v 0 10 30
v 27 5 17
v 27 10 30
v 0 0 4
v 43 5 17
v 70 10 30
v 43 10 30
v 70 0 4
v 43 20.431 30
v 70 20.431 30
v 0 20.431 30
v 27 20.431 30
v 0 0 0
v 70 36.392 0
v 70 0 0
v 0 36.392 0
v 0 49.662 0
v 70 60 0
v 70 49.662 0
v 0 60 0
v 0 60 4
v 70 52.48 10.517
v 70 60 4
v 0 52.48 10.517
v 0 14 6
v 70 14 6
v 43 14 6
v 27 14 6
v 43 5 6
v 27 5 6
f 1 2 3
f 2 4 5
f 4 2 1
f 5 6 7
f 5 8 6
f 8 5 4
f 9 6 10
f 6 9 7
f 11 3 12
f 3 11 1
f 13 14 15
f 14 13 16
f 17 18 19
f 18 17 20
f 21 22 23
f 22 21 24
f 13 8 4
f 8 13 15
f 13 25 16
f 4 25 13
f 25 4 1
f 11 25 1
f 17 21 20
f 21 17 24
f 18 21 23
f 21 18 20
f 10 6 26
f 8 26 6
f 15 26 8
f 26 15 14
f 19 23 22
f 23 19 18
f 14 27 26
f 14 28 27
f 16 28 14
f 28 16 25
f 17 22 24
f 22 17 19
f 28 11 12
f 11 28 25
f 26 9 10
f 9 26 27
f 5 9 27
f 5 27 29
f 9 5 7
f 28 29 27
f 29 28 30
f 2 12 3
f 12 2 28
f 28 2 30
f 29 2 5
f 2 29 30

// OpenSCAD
// Desk stand for a handheld radio, slot width = radio thickness + 1 mm. Leans the radio back 15 deg. CC0.
slot = 36; depth = 60; base_w = 70;
$fn = 40;
difference() {
  hull() { cube([base_w, depth, 4]); translate([0, 10, 0]) cube([base_w, 20, 30]); }
  translate([-1, 14, 6]) rotate([-15, 0, 0]) cube([base_w + 2, slot, 60]);
  translate([base_w / 2 - 8, 5, 6]) cube([16, 40, 40]);  // charger/antenna cable notch
}
